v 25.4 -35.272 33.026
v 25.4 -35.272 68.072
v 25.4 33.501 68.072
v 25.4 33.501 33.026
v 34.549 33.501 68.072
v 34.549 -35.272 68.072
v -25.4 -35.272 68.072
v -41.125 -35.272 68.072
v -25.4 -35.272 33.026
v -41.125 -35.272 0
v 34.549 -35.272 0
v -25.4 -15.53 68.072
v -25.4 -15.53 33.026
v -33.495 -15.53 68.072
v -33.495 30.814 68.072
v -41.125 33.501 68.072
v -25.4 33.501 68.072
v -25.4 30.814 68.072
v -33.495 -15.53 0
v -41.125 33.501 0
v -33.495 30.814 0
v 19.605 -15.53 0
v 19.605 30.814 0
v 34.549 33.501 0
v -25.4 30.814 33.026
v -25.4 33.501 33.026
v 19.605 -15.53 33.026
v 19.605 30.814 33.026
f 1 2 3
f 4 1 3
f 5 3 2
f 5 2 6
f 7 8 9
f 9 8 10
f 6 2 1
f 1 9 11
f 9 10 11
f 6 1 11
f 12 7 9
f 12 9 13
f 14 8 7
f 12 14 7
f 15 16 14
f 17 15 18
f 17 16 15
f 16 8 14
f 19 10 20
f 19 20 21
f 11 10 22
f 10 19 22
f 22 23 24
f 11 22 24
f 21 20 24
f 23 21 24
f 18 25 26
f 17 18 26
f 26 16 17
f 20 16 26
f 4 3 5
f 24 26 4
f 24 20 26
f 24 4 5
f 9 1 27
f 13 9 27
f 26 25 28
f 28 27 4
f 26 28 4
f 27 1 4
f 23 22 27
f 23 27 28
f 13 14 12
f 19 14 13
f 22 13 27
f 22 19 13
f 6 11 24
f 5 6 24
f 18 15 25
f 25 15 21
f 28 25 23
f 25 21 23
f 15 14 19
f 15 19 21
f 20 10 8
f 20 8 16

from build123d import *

# Parameters (mm, degrees)
F0_W     = 75.673942
F0_H     = 68.772793
F1_DEPTH = 68.072
F2_W     = 53.099798
F2_H     = 46.344617
F3_DEPTH = 104.902
F4_W     = 137.758225
F4_H     = 67.900397
F5_DEPTH = 25.4


with BuildPart() as f1:
    # F0 (on Top) → F1 (new body)
    with BuildSketch(Plane.XY):
        with Locations((-3.288293, -0.885312)):
            Rectangle(F0_W, F0_H)
    extrude(amount=F1_DEPTH)

    # F2 (on Top) → F3 (cut)
    with BuildSketch(Plane.XY):
        with Locations((-6.945002, 7.641886)):
            Rectangle(F2_W, F2_H)
    extrude(amount=F3_DEPTH, mode=Mode.SUBTRACT)

    # F4 (on Right) → F5 (cut, symmetric)
    with BuildSketch(Plane.YZ):
        with Locations((14.477775, 66.976663)):
            Rectangle(F4_W, F4_H)
    extrude(amount=F5_DEPTH, both=True, mode=Mode.SUBTRACT)


solid = f1.part
